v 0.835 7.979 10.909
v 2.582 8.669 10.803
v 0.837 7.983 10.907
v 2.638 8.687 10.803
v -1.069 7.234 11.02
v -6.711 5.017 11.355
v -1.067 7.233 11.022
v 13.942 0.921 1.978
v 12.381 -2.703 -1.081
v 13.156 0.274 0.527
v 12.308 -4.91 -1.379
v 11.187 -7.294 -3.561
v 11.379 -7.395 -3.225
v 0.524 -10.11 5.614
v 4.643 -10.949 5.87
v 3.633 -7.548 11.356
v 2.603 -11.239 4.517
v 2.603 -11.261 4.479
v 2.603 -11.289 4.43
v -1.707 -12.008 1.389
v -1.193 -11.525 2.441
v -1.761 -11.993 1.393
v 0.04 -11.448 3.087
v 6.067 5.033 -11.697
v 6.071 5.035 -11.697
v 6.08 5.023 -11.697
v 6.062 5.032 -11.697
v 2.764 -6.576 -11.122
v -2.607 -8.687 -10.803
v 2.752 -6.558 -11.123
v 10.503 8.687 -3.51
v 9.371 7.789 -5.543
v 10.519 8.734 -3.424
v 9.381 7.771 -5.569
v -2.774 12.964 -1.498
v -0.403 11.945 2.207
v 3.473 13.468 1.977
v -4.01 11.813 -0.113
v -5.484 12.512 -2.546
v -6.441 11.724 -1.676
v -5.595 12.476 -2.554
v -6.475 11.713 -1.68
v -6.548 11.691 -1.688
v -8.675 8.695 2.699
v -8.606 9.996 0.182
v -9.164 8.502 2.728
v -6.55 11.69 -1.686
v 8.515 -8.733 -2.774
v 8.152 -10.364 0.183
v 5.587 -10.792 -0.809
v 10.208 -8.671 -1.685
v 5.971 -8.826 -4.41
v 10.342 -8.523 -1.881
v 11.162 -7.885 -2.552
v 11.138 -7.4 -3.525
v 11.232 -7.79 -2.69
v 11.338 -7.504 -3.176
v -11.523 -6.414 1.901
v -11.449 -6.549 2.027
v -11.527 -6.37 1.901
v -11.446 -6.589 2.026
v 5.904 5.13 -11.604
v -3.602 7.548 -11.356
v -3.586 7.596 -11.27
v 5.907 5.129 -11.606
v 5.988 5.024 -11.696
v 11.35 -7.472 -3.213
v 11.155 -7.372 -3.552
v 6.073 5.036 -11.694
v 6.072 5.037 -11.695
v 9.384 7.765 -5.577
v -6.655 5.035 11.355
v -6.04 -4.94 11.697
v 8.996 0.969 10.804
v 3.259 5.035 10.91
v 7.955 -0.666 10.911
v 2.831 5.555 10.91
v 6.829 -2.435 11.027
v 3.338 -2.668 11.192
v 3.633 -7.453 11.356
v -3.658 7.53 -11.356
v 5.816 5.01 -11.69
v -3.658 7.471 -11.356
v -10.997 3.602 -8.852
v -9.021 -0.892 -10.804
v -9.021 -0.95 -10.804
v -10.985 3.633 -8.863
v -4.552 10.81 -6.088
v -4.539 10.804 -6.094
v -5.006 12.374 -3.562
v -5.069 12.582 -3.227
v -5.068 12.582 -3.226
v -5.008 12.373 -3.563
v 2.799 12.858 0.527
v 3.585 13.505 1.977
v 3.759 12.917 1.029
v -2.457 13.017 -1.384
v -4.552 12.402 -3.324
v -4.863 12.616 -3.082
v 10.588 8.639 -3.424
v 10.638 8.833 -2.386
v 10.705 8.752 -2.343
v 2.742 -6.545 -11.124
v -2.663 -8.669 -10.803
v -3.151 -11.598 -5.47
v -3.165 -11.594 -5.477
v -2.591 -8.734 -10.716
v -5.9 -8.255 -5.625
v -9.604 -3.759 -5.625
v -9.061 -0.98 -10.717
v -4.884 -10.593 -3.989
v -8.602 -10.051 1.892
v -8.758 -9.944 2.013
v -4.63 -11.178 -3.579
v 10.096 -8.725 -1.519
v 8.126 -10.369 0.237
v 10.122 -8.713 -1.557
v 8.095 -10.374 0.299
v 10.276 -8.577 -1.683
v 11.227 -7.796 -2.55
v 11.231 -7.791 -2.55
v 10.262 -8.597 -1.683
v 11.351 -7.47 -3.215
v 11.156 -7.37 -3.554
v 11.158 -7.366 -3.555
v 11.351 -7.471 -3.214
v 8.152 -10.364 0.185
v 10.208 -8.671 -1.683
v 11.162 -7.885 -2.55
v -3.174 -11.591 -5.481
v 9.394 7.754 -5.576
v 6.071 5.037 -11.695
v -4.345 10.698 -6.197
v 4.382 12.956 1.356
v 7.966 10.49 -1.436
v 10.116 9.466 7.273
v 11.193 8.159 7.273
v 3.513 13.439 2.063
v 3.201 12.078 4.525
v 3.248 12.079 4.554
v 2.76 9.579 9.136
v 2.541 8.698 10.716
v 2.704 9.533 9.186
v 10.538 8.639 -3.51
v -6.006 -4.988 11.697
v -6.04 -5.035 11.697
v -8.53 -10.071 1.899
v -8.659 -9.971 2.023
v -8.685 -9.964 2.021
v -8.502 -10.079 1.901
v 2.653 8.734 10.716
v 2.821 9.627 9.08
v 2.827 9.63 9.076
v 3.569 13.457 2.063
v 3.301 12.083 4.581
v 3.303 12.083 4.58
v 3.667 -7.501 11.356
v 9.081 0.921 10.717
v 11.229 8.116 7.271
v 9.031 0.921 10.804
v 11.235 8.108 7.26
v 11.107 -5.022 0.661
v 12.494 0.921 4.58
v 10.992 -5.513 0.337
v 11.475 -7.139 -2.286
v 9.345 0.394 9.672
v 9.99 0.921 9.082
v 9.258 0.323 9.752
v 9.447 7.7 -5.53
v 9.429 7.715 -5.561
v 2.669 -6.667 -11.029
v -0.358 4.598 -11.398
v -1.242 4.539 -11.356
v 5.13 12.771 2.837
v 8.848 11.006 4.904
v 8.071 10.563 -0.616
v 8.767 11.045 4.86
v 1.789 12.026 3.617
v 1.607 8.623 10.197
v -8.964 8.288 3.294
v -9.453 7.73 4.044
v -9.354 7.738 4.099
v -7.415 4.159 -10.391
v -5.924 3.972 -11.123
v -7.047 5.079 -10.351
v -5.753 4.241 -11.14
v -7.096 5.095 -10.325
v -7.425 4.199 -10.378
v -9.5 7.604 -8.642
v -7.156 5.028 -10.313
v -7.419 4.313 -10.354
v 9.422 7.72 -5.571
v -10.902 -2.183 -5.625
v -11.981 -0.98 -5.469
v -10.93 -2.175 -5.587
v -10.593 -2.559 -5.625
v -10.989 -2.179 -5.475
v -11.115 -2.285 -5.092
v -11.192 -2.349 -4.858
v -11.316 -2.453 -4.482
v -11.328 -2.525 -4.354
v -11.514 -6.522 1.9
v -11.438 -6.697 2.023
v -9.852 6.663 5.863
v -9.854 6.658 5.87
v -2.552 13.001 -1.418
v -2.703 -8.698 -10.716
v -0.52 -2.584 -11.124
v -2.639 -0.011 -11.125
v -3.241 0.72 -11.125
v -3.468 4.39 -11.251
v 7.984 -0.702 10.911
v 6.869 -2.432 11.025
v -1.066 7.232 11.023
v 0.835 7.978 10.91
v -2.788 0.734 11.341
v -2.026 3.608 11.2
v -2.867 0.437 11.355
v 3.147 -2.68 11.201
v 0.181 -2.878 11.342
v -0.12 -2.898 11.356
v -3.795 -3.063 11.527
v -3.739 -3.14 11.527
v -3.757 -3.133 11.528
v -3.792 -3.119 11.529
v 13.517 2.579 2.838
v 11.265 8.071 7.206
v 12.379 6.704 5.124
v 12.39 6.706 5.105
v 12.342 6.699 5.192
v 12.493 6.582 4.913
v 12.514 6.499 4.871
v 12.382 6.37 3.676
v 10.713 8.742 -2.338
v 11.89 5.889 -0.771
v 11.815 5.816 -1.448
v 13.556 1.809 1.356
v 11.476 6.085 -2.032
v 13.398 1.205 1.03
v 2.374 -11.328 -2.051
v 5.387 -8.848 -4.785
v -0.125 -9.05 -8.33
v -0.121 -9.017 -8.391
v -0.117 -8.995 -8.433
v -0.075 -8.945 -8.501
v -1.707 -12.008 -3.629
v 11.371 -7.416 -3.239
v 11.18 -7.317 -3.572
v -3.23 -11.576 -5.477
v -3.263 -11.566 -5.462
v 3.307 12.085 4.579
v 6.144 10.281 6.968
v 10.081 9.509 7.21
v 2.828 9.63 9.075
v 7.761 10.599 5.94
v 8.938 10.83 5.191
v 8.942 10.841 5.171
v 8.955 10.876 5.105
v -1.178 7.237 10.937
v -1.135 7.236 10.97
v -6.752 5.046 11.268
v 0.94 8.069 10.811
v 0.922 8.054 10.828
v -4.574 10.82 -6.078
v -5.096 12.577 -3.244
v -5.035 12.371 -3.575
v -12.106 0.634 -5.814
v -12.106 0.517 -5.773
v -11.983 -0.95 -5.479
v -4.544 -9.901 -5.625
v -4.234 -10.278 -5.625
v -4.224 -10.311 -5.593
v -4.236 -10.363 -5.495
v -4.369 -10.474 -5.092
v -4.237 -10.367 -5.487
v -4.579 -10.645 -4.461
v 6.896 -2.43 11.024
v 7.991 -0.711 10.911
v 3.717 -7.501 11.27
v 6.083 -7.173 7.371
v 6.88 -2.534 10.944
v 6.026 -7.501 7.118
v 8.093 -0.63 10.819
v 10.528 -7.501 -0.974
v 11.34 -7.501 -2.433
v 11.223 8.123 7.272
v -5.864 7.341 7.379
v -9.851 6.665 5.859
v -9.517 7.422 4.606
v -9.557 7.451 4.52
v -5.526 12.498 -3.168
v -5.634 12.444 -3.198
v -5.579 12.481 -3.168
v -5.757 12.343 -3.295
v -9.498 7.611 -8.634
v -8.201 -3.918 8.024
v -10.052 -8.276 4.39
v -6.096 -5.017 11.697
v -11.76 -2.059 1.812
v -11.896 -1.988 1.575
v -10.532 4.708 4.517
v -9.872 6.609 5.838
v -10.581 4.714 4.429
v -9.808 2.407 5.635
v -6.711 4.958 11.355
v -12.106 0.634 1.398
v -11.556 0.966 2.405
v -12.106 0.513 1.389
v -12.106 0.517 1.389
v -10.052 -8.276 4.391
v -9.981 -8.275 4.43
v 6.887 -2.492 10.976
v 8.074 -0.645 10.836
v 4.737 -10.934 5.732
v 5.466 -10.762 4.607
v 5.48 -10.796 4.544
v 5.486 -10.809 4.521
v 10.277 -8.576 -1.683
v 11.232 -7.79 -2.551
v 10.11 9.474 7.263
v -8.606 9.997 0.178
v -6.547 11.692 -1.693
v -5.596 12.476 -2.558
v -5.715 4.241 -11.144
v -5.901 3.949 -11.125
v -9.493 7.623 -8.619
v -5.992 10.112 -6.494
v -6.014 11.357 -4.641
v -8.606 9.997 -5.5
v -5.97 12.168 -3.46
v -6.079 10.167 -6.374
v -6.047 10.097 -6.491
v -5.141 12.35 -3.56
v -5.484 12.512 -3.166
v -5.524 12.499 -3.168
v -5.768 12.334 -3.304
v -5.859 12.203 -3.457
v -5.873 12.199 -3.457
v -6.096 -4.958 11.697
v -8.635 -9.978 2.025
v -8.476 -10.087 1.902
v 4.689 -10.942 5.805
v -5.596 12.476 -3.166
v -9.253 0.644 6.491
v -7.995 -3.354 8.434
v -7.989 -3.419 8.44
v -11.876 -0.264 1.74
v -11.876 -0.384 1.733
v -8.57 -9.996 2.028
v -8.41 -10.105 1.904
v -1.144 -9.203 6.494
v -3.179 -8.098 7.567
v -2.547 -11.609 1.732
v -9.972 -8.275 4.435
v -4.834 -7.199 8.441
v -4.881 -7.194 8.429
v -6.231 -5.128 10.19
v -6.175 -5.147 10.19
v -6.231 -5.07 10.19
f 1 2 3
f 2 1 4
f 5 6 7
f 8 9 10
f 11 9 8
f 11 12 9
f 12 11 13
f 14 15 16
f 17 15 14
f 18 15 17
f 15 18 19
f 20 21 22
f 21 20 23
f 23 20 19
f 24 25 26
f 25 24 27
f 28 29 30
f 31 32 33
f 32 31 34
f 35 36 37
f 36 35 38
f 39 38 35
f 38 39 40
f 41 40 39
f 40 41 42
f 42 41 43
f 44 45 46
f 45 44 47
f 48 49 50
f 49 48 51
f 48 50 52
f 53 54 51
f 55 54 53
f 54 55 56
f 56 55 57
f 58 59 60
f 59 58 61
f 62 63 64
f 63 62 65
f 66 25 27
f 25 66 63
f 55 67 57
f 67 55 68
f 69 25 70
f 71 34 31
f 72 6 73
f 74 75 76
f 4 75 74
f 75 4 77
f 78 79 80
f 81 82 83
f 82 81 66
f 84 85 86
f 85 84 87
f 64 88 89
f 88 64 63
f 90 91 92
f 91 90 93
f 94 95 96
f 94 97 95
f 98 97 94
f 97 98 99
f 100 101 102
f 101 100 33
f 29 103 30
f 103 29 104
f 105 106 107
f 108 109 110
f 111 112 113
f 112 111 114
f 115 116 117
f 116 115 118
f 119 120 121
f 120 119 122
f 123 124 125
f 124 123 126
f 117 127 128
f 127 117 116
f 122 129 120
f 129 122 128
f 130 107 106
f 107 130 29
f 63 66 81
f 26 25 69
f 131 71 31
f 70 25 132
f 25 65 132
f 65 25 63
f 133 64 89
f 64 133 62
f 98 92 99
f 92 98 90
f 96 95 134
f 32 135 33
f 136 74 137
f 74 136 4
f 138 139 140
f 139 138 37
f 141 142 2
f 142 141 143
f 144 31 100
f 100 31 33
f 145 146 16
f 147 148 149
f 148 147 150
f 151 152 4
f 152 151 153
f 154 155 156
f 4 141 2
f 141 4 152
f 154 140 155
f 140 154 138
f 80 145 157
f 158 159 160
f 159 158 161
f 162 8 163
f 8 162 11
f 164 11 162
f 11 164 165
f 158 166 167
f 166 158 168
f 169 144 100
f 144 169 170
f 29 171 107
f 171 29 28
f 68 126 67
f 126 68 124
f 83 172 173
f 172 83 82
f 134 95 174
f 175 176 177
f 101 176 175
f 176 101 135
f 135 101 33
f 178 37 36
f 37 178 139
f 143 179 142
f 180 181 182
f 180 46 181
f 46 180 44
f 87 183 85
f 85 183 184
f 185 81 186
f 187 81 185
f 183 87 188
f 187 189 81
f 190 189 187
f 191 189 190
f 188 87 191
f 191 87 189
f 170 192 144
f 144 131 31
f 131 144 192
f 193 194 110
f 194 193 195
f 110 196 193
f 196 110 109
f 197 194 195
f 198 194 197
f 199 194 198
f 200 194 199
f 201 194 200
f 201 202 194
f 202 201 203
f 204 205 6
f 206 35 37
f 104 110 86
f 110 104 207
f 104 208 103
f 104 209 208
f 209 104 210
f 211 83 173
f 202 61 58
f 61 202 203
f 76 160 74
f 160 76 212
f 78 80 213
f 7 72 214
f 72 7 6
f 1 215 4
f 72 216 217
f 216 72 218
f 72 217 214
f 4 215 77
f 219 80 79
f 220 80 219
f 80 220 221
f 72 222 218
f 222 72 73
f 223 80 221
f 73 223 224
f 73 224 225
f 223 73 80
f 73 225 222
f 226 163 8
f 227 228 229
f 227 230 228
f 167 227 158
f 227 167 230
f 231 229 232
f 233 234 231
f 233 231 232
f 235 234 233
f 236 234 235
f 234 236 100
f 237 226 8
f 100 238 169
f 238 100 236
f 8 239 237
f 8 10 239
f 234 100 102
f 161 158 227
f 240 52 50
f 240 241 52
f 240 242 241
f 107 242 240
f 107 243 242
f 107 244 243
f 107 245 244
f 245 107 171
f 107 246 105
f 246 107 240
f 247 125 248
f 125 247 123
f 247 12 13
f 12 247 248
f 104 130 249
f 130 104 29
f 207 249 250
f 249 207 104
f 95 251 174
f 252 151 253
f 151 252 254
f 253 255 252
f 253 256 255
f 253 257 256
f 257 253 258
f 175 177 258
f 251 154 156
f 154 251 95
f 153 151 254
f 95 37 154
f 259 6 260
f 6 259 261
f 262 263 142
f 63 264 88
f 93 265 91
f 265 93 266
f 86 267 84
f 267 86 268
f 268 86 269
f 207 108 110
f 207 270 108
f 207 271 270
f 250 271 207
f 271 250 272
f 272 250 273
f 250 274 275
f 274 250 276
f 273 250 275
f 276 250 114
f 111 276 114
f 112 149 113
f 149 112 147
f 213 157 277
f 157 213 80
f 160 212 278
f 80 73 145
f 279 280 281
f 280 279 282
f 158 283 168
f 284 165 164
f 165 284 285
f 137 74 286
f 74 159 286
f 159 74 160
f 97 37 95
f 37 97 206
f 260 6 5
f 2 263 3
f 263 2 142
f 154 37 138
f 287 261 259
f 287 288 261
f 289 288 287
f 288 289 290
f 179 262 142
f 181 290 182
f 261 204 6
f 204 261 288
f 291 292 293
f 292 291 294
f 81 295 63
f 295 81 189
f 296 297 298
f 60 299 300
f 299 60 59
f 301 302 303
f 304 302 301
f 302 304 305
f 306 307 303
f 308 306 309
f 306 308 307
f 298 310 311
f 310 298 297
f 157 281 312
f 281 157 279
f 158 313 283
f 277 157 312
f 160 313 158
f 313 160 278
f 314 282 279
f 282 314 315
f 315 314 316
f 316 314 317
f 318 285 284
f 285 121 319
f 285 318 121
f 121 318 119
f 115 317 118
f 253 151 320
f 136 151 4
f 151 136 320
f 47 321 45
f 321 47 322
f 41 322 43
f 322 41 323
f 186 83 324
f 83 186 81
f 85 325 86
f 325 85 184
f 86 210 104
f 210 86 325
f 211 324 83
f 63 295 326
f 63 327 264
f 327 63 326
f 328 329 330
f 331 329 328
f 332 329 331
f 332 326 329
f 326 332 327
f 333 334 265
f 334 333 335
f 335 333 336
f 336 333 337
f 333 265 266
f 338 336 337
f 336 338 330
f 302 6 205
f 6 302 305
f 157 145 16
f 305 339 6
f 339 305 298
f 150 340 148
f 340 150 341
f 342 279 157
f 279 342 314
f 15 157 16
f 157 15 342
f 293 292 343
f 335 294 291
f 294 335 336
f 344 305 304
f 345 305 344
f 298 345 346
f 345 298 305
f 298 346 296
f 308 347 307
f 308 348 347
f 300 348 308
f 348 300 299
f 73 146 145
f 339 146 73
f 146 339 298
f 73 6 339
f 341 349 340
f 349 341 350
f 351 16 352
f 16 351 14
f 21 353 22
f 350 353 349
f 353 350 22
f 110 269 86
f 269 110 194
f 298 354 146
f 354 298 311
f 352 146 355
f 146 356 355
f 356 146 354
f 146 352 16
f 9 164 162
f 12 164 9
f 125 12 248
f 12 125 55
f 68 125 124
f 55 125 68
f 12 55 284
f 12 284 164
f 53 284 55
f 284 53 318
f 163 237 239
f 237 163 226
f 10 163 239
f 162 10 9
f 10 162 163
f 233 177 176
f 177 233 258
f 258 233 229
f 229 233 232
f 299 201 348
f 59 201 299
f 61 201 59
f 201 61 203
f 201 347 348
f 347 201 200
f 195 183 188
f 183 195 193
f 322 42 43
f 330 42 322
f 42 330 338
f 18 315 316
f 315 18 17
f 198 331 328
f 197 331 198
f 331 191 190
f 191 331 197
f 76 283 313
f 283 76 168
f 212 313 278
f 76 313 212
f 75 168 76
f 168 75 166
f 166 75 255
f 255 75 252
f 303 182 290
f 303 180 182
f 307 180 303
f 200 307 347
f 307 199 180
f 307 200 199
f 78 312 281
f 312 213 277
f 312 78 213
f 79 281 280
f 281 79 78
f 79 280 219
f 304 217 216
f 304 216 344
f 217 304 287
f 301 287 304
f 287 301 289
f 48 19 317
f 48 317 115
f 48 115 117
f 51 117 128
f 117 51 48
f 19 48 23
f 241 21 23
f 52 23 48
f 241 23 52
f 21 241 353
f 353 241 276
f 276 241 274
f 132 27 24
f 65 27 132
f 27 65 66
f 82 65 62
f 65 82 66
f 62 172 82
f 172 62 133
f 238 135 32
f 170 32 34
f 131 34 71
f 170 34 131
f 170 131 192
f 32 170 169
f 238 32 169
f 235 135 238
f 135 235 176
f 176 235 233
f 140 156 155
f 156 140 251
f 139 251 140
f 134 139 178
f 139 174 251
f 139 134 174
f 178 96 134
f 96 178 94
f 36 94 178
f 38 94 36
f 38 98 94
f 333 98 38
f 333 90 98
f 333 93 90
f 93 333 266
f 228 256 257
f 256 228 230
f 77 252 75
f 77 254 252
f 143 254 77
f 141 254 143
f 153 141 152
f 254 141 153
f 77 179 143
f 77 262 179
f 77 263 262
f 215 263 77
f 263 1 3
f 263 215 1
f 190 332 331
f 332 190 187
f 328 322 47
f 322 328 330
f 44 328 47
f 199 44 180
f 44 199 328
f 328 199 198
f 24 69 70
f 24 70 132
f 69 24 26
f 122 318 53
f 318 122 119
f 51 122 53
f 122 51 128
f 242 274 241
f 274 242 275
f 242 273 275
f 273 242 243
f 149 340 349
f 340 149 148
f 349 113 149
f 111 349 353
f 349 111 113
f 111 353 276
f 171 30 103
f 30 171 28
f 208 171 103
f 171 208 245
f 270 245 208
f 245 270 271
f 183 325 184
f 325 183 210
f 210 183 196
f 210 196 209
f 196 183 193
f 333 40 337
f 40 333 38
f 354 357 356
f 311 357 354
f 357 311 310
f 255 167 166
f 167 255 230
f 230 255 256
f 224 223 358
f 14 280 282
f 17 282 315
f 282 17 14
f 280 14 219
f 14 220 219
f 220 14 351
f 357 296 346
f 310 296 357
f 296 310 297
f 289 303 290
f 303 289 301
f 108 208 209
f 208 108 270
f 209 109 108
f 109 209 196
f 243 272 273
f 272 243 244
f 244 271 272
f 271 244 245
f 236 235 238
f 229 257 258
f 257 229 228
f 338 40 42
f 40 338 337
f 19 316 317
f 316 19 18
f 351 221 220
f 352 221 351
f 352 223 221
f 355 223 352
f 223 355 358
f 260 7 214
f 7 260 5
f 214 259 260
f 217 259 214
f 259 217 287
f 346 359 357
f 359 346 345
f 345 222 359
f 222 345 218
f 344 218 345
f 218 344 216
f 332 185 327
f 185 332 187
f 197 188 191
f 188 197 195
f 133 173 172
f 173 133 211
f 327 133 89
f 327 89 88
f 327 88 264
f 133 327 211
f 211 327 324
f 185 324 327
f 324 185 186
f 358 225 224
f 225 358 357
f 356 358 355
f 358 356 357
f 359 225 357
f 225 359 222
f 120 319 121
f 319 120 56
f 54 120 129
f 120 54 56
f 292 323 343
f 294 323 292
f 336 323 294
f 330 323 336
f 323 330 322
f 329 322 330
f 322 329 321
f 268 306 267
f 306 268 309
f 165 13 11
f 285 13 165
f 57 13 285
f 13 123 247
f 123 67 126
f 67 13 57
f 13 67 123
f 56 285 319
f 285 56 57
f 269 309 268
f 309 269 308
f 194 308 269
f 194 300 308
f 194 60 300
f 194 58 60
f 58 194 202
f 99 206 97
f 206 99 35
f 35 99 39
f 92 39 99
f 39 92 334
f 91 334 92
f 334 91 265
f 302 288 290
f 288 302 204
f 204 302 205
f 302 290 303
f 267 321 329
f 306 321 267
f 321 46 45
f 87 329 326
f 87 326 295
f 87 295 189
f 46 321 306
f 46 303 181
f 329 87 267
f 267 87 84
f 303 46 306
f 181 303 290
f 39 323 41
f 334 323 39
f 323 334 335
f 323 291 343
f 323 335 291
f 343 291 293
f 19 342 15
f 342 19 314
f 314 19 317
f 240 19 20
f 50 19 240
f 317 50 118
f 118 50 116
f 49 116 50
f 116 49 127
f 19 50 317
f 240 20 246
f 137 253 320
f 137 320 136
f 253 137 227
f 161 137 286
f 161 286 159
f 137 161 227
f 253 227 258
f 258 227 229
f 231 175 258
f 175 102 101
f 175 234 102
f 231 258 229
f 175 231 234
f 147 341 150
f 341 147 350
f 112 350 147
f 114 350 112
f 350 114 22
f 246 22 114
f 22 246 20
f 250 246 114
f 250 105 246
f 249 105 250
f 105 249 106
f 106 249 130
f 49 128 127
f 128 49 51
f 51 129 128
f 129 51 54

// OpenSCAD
// Auto-generated OpenSCAD file

    inner_points = 10*[[-0.4820813211250987, -1.0449238650604131, -0.5104799034334353], [-0.052587296473702555, 1.0049095944004596, 1.060449642253799], [0.3132765628671369, -0.7900923074517557, -1.060449642253799], [0.7427705875185331, 1.259741152009117, 0.5104799034334353], [0.8121529711437319, -1.026904669604844, 0.4604304395233323], [0.9762050905955799, -0.24393795936757026, 1.060472132044425], [-0.7155158242021455, 0.4587552463162742, -1.060472132044425], [-0.5514637047502975, 1.241721956553548, -0.4604304395233323], [-0.6190335754244582, -0.5099059922176972, 1.010386278888689], [1.4632403980874105, 0.15725168700784506, -0.4294531901269253], [-1.2025511316939763, 0.05756559994085883, 0.4294531901269253], [0.8797228418178926, 0.7247232791664011, -1.010386278888689], [-0.1737587446246939, -1.191281953827171, 0.4294756799175514], [0.09168316057485429, 0.07558479539642826, 1.400363533083693], [1.1131573448949394, -0.7789558322102864, -0.4603940502776995], [1.3785992500944875, 0.487910917013313, 0.5104938028884421], [-1.1179099837010533, -0.27309363006460907, -0.5104938028884421], [-0.8524680785015052, 0.9937731191589904, 0.4603940502776995], [0.16900610581858003, 0.13923249155227563, -1.400363533083693], [0.43444801101812824, 1.406099240775875, -0.4294756799175514], [-1.1201047009544618, -0.9226987816684733, 0.249774787956858], [1.0980326190753988, -0.212010675559726, -1.284010728119616]];

    outer_points = 10*[[0.3553738060072703, 1.340954088422547, 0.19767924096673445], [0.5163570327909294, -1.270590953937949, 0.28722732116012484], [-0.5163570327909294, 1.270590953937949, -0.28722732116012484], [-0.3553738060072703, -1.340954088422547, -0.19767924096673445], [-0.6670731664763409, 0.4987607215152127, 1.1268436558827821], [-0.6055830454636154, -0.4987607215152127, 1.161047978889356], [0.6055830454636154, 0.4987607215152127, -1.161047978889356], [0.6670731664763409, -0.4987607215152127, -1.1268436558827821], [0.8980547740238846, 0.09210653881782889, 1.071699351461188], [-1.3841661909912581, -0.09210653881782889, -0.19780250955479217], [1.3841661909912581, 0.09210653881782889, 0.19780250955479217], [-0.8980547740238846, -0.09210653881782889, -1.071699351461188], [0.26222611273671315, 0.863936771240565, 1.0716231672840233], [0.36171921850764677, -0.7500868280895054, 1.1269669244708398], [-1.1482640134802296, 0.7500868280895054, 0.28702786839490235], [-1.048770907709296, -0.863936771240565, 0.34237162558171885], [1.048770907709296, 0.863936771240565, -0.34237162558171885], [1.1482640134802296, -0.7500868280895054, -0.28702786839490235], [-0.36171921850764677, 0.7500868280895054, -1.1269669244708398], [-0.26222611273671315, -0.863936771240565, -1.0716231672840233], [1.162572789567373, 0.9577836380236123, 0.6466894935006993], [-1.2685575801393754, 0.7615511020849973, -0.7056442971472661]];

    // Convex hull for inner set (I)
    module inner_hull() {
        hull() {
            for (p = inner_points) {
                translate(p) sphere(r=0.1);
            }
        }
    }

    // Convex hull for outer set (O) minus inner hull (O \ I)
    module outer_minus_inner() {
        difference() {
            hull() {
                for (p = outer_points) {
                    translate(p) sphere(r=0.1);
                }
            }
            inner_hull(); // Subtract inner hull
        }
    }

    // Convex hull for outer set (O) minus all translated inner hulls
    module outer_minus_AllTranslationInner() {
        difference() {
            hull() {
                for (p = outer_points) {
                    translate(p) sphere(r=0.1);
                }
            }
            hull() {
                translate([0,0,50]) inner_hull();
                translate([0,0,-50]) inner_hull();
            }; // Subtract translated inner hulls
        }
    }

    // Difference between outer_minus_inner and outer_minus_AllTranslationInner
    module outer_minus_inner_diff() {
        difference() {
            // Outer minus inner
            difference() {
                hull() {
                    for (p = outer_points) {
                        translate(p) sphere(r=0.1);
                    }
                }
                inner_hull();
            }

            // Subtract Outer minus AllTranslationInner
            difference() {
                hull() {
                    for (p = outer_points) {
                        translate(p) sphere(r=0.1);
                    }
                }
                hull() {
                    translate([0,0,50]) inner_hull();
                    translate([0,0,-50]) inner_hull();
                };
            }
        }
    }

    // Rendering all with colors applied
    color([1, 1, 0, 1]) outer_minus_inner_diff(); // Opaque yellow
    
